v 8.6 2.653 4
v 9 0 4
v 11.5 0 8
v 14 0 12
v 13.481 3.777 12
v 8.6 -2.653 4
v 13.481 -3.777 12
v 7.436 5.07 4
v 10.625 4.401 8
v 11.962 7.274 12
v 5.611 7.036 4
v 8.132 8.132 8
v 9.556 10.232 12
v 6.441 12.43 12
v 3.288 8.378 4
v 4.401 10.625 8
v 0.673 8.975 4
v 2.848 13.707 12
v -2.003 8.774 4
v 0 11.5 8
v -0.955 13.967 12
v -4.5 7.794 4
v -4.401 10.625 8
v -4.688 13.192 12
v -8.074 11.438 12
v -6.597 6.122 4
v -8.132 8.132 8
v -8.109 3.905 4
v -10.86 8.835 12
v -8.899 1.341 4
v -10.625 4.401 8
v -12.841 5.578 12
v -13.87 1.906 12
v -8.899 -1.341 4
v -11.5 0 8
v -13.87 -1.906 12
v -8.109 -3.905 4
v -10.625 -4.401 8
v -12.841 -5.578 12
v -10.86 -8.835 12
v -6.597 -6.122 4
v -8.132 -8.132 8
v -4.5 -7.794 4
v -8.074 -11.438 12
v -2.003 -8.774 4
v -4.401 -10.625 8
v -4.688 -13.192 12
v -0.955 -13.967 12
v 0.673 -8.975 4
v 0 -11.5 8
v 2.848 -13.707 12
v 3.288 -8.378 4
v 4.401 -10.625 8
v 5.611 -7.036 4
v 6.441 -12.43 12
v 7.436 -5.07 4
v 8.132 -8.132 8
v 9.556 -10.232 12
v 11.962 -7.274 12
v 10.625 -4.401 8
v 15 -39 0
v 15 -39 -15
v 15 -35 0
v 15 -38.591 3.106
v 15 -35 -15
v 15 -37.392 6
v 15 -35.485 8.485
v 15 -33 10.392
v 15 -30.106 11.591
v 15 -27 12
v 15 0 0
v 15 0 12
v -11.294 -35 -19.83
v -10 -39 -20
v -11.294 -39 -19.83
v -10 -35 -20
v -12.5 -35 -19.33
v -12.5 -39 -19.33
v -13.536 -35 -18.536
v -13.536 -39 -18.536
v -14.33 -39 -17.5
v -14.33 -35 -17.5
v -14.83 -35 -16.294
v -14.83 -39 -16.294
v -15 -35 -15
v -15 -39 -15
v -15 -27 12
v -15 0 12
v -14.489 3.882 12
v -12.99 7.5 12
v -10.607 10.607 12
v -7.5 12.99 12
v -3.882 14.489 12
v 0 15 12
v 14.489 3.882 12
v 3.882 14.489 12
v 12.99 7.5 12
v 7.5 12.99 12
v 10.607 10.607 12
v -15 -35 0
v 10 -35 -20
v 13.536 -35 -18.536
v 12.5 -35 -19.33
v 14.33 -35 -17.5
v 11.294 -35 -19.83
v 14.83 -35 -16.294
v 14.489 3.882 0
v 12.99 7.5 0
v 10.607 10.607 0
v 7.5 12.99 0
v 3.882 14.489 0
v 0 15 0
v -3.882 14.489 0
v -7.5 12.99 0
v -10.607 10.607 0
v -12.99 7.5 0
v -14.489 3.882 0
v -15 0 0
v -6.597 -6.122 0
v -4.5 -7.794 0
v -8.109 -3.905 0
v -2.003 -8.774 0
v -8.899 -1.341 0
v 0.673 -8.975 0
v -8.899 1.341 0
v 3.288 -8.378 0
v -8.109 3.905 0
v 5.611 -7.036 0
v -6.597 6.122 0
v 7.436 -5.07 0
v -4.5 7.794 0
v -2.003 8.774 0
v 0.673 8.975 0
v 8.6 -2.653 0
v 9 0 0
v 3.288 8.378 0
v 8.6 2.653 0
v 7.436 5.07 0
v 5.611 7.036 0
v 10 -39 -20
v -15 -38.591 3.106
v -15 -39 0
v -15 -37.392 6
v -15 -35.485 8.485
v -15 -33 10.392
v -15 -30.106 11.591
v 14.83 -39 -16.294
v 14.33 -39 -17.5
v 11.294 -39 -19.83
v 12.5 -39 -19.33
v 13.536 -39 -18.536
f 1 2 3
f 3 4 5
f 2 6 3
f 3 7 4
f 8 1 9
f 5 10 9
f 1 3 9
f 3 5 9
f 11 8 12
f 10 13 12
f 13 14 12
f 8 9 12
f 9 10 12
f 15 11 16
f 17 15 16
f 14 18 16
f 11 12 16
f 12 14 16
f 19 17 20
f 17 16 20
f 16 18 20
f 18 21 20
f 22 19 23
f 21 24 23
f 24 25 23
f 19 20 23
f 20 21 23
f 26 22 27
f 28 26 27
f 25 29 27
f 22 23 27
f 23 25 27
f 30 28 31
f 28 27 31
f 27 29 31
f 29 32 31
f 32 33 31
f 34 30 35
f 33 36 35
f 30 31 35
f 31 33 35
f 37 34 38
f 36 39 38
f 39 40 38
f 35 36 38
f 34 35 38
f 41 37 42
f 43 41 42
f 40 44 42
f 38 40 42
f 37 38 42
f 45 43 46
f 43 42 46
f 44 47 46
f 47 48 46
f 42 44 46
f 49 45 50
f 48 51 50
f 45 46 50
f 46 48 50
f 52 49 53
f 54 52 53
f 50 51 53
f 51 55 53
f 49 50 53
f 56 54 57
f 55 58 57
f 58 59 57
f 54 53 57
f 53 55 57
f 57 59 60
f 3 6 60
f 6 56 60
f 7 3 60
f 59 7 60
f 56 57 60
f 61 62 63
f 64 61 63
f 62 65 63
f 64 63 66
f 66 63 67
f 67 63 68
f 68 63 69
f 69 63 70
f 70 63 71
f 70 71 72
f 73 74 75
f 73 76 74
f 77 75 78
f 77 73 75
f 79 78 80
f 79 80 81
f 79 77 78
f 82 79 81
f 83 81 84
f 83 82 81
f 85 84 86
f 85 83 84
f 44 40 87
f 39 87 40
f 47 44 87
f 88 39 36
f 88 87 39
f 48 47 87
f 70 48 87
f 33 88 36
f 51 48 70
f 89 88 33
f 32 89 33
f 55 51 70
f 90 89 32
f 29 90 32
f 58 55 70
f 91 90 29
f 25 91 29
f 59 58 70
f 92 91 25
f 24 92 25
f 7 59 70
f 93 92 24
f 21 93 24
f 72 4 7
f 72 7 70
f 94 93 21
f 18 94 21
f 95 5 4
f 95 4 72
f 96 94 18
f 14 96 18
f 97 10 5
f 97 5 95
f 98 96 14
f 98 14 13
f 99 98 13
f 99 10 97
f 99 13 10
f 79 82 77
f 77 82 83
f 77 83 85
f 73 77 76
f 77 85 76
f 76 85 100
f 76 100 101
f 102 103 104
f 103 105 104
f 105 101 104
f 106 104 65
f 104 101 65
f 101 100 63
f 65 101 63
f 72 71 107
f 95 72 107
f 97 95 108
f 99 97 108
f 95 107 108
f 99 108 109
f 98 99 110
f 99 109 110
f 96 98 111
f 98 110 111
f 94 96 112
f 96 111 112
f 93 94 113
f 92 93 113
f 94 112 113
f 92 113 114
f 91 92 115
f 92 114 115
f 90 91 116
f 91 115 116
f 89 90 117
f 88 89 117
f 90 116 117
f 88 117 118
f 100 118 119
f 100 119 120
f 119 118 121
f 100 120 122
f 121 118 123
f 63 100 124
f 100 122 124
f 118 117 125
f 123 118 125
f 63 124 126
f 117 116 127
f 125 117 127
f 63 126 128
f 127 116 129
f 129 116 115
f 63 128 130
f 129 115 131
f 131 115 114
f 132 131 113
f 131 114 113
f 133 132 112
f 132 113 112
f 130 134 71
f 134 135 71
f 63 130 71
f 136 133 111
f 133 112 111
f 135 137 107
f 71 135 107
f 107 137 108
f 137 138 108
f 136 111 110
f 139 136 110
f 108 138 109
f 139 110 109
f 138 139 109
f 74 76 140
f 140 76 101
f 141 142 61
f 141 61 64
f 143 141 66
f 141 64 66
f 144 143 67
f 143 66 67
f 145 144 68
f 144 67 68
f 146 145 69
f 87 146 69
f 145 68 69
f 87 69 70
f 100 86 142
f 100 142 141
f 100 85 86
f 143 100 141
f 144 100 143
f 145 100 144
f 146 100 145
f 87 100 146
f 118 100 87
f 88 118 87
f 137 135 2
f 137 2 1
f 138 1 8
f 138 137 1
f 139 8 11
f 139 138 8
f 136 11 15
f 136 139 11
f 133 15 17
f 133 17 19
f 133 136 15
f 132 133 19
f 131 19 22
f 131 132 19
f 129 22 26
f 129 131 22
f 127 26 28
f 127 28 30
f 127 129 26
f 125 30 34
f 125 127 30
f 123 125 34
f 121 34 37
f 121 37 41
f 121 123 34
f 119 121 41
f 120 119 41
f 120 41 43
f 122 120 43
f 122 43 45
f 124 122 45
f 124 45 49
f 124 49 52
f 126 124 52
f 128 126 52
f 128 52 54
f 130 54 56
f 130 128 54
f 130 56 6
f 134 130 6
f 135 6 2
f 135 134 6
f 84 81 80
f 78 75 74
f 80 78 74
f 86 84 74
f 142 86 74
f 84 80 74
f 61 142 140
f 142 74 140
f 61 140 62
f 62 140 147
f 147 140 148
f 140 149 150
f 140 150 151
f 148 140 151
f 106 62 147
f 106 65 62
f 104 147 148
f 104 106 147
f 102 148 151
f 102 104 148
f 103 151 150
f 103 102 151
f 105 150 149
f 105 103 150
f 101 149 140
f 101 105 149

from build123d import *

# Parameters (mm, degrees)
F0_R     = 12
F0_W     = 30
F0_H     = 4
F0_R_2   = 9
F1_DEPTH = 3
F2_DEPTH = 20
F3_DEPTH = 6
F4_SIZE  = 2.99999
F6_DEPTH = 12
F7_SIZE2 = 5
F7_SIZE  = 8
F8_DEPTH = 4
F9_R     = 12
F10_R    = 5


# Not quite as in the source:
# - a fillet or chamfer is up to 0.001 mm smaller than in the source, because OpenCascade refuses the exact size


with BuildPart() as f1:
    # F0 (on Top) → F1 (new body)
    with BuildSketch(Plane.XY):
        with BuildLine():
            Line((15, -35), (15, 0))
            ThreePointArc((15, 0), (0, 15), (-15, 0))
            Line((-15, 0), (-15, -35))
            Line((-15, -35), (15, -35))
        make_face()
        Circle(F0_R, mode=Mode.SUBTRACT)
        with Locations((0, -37)):
            Rectangle(F0_W, F0_H)
        Circle(F0_R)
        Circle(F0_R_2, mode=Mode.SUBTRACT)
    extrude(amount=F1_DEPTH)

    # F0 (on Top) → F2 (join)
    with BuildSketch(Plane.XY):
        with Locations((0, -37)):
            Rectangle(F0_W, F0_H)
    extrude(amount=-F2_DEPTH)

    # F0 (on Top) → F3 (join)
    with BuildSketch(Plane.XY):
        Circle(F0_R)
        Circle(F0_R_2, mode=Mode.SUBTRACT)
    extrude(amount=F3_DEPTH)

    # F4 (size 3 in the source; OpenCascade refuses exactly that, so slightly less here)
    f4_edges = [f1.edges().sort_by_distance(p)[0] for p in [
        (-12, 0, 3),
    ]]
    chamfer(f4_edges, length=F4_SIZE)

    # F0 (on Top) → F6 (join)
    with BuildSketch(Plane.XY):
        with BuildLine():
            Line((15, -35), (15, 0))
            ThreePointArc((15, 0), (0, 15), (-15, 0))
            Line((-15, 0), (-15, -35))
            Line((-15, -35), (15, -35))
        make_face()
        Circle(F0_R, mode=Mode.SUBTRACT)
        Circle(F0_R)
        Circle(F0_R_2, mode=Mode.SUBTRACT)
    extrude(amount=F6_DEPTH)

    # F7
    f7_edges = [f1.edges().sort_by_distance(p)[0] for p in [
        (-9, 0, 12),
    ]]
    f7_side = f1.faces().sort_by_distance((-9, 0, 6))[0]
    chamfer(f7_edges, length=F7_SIZE, length2=F7_SIZE2, reference=f7_side)

    # F8 (add, through all): a face of the model
    f8_faces = [f1.faces().sort_by_distance(p)[0] for p in [
        (0, -35, 7.5),
    ]]
    extrude(f8_faces, amount=F8_DEPTH)

    # F9
    f9_edges = [f1.edges().sort_by_distance(p)[0] for p in [
        (0, -39, 12),
    ]]
    fillet(f9_edges, radius=F9_R)

    # F10
    f10_edges = [f1.edges().sort_by_distance(p)[0] for p in [
        (-15, -37, -20),
        (15, -37, -20),
    ]]
    fillet(f10_edges, radius=F10_R)


solid = f1.part
